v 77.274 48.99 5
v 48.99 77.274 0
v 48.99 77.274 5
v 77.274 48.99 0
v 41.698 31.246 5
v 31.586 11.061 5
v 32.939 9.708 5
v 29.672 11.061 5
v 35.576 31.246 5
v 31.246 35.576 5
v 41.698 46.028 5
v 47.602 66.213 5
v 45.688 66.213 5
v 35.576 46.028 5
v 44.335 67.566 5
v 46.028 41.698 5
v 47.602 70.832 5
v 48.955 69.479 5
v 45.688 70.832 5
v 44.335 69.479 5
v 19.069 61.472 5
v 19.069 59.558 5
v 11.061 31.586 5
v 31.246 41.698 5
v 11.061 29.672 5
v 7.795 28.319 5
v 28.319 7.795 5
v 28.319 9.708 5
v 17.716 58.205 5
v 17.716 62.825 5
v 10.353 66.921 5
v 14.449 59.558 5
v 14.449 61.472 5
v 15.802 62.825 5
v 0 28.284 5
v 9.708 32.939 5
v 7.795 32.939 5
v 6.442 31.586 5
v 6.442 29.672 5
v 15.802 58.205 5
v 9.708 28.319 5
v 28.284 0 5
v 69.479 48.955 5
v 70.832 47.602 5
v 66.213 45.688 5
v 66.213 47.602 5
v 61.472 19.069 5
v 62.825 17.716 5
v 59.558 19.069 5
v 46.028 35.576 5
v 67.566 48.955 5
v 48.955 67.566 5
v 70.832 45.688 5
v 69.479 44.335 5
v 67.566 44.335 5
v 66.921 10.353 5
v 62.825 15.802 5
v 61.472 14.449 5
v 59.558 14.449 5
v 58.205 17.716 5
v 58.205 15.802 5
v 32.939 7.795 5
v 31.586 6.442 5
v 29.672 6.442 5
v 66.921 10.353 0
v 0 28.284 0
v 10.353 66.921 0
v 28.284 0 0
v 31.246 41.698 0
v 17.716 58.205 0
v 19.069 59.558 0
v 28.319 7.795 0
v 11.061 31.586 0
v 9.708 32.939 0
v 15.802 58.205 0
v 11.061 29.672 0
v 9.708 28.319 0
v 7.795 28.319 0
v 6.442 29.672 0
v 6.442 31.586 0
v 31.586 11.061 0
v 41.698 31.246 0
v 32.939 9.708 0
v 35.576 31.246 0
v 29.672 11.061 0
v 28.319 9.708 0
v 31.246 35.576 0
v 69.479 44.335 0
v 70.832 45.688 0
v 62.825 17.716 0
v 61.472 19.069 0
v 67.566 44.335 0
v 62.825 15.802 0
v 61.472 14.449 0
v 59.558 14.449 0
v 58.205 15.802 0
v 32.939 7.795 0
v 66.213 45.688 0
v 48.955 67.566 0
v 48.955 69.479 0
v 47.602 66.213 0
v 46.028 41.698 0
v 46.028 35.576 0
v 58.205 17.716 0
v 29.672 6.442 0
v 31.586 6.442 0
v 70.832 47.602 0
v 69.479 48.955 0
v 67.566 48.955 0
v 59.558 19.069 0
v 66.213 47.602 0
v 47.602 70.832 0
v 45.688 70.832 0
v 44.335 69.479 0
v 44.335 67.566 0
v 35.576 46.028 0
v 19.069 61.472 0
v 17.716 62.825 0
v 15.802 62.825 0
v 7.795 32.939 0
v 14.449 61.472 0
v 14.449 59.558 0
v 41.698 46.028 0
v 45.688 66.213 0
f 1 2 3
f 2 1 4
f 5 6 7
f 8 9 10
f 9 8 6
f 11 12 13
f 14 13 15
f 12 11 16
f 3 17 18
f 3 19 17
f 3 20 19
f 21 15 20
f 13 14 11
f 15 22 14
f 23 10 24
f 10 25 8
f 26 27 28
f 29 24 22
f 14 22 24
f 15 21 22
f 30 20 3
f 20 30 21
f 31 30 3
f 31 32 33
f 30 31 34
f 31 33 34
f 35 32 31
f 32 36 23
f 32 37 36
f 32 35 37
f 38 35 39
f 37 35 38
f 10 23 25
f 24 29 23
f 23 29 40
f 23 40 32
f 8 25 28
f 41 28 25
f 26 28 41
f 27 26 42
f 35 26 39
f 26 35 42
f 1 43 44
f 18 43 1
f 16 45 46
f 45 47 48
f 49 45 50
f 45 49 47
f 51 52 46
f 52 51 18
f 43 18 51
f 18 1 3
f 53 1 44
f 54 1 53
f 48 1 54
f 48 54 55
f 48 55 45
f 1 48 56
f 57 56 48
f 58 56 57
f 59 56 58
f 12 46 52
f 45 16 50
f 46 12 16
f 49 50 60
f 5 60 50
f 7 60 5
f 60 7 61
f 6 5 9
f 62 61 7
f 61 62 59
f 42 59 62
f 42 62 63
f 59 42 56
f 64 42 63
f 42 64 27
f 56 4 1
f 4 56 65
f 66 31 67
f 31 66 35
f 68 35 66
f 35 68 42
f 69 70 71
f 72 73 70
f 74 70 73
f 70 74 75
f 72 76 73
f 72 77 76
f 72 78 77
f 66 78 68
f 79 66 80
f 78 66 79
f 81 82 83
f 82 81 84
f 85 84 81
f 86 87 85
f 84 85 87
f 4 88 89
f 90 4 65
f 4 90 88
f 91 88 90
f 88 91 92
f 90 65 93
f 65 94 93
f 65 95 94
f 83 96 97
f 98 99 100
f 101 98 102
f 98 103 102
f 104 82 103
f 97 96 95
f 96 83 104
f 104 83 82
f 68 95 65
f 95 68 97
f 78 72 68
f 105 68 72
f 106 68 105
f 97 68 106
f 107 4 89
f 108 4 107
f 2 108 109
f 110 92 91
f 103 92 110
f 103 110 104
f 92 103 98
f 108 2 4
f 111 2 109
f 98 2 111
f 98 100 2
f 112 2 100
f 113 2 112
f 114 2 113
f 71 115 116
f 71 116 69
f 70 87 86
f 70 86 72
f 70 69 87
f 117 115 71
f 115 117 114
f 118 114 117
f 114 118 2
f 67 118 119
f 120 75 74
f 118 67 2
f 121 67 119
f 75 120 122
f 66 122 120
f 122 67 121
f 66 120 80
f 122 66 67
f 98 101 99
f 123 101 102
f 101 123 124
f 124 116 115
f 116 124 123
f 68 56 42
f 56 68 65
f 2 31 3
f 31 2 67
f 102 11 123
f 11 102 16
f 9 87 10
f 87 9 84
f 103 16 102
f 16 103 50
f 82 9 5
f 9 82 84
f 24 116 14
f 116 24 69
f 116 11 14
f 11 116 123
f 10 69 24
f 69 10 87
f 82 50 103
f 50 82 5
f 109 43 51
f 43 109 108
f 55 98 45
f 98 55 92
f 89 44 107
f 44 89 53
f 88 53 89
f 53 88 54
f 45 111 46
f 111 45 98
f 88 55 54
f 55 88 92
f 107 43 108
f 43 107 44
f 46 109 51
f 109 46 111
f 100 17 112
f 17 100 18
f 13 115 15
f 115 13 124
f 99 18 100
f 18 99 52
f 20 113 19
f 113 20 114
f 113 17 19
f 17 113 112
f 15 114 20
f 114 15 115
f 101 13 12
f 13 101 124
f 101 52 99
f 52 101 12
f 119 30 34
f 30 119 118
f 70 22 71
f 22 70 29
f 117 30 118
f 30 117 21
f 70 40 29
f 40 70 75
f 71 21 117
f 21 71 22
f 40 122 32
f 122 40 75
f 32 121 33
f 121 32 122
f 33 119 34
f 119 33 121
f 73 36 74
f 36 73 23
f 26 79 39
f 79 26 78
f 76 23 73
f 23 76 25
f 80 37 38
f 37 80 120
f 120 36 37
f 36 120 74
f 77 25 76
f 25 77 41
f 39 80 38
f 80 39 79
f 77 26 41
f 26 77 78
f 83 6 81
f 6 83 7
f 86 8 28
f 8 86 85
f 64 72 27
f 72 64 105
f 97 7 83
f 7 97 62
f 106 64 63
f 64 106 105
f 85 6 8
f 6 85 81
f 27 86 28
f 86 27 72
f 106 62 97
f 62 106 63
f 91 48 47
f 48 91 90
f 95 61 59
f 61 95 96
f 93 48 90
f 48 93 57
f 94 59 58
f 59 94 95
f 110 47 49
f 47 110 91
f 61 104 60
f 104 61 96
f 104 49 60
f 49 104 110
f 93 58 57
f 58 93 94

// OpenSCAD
$fn = 32;

// ----------------------------------------------------------------------
// Polygon plate: 6-gon R40, 6 bolt windows
// ----------------------------------------------------------------------

// --- parameters (mm) ---
sides = 6;                // number of polygon sides
plate_r = 40;             // circumscribed radius of the polygon
bore_r = 8;               // centre bore radius
bolts = 6;                // number of bolt windows
ring_r = 30.94;           // bolt-circle radius
bolt_r = 2.5;             // bolt window radius
plate_t = 5;              // plate thickness, Z (extrusion height)
fit_tol = 0.02;           // declared fit tolerance (prompt contract)
free_tol = 0.2;           // declared free tolerance (prompt contract)

plate_d = 2 * plate_r;  // circumscribed diameter
bore_d = 2 * bore_r;  // centre bore diameter
bolt_d = 2 * bolt_r;  // bolt window diameter
ring_d = 2 * ring_r;  // bolt-circle diameter

profile = [[77.274, 48.99], [48.99, 77.274], [10.353, 66.921], [0, 28.284], [28.284, 0], [66.921, 10.353]];  // primary outline, 6 points, counter clockwise
void_1 = [[46.028, 41.698], [41.698, 46.028], [35.576, 46.028], [31.246, 41.698], [31.246, 35.576], [35.576, 31.246], [41.698, 31.246], [46.028, 35.576]];  // centre bore, 8 points
void_2 = [[70.832, 47.602], [69.479, 48.955], [67.566, 48.955], [66.213, 47.602], [66.213, 45.688], [67.566, 44.335], [69.479, 44.335], [70.832, 45.688]];  // bolt window 1, 8 points
void_3 = [[48.955, 69.479], [47.602, 70.832], [45.688, 70.832], [44.335, 69.479], [44.335, 67.566], [45.688, 66.213], [47.602, 66.213], [48.955, 67.566]];  // bolt window 2, 8 points
void_4 = [[19.069, 61.472], [17.716, 62.825], [15.802, 62.825], [14.449, 61.472], [14.449, 59.558], [15.802, 58.205], [17.716, 58.205], [19.069, 59.558]];  // bolt window 3, 8 points
void_5 = [[11.061, 31.586], [9.708, 32.939], [7.795, 32.939], [6.442, 31.586], [6.442, 29.672], [7.795, 28.319], [9.708, 28.319], [11.061, 29.672]];  // bolt window 4, 8 points
void_6 = [[32.939, 9.708], [31.586, 11.061], [29.672, 11.061], [28.319, 9.708], [28.319, 7.795], [29.672, 6.442], [31.586, 6.442], [32.939, 7.795]];  // bolt window 5, 8 points
void_7 = [[62.825, 17.716], [61.472, 19.069], [59.558, 19.069], [58.205, 17.716], [58.205, 15.802], [59.558, 14.449], [61.472, 14.449], [62.825, 15.802]];  // bolt window 6, 8 points

// --- the one profile operation ---
difference() {
  linear_extrude(height = plate_t) polygon(points = profile);
  translate([0, 0, -1])
    linear_extrude(height = plate_t + 2) polygon(points = void_1);
  translate([0, 0, -1])
    linear_extrude(height = plate_t + 2) polygon(points = void_2);
  translate([0, 0, -1])
    linear_extrude(height = plate_t + 2) polygon(points = void_3);
  translate([0, 0, -1])
    linear_extrude(height = plate_t + 2) polygon(points = void_4);
  translate([0, 0, -1])
    linear_extrude(height = plate_t + 2) polygon(points = void_5);
  translate([0, 0, -1])
    linear_extrude(height = plate_t + 2) polygon(points = void_6);
  translate([0, 0, -1])
    linear_extrude(height = plate_t + 2) polygon(points = void_7);
}
